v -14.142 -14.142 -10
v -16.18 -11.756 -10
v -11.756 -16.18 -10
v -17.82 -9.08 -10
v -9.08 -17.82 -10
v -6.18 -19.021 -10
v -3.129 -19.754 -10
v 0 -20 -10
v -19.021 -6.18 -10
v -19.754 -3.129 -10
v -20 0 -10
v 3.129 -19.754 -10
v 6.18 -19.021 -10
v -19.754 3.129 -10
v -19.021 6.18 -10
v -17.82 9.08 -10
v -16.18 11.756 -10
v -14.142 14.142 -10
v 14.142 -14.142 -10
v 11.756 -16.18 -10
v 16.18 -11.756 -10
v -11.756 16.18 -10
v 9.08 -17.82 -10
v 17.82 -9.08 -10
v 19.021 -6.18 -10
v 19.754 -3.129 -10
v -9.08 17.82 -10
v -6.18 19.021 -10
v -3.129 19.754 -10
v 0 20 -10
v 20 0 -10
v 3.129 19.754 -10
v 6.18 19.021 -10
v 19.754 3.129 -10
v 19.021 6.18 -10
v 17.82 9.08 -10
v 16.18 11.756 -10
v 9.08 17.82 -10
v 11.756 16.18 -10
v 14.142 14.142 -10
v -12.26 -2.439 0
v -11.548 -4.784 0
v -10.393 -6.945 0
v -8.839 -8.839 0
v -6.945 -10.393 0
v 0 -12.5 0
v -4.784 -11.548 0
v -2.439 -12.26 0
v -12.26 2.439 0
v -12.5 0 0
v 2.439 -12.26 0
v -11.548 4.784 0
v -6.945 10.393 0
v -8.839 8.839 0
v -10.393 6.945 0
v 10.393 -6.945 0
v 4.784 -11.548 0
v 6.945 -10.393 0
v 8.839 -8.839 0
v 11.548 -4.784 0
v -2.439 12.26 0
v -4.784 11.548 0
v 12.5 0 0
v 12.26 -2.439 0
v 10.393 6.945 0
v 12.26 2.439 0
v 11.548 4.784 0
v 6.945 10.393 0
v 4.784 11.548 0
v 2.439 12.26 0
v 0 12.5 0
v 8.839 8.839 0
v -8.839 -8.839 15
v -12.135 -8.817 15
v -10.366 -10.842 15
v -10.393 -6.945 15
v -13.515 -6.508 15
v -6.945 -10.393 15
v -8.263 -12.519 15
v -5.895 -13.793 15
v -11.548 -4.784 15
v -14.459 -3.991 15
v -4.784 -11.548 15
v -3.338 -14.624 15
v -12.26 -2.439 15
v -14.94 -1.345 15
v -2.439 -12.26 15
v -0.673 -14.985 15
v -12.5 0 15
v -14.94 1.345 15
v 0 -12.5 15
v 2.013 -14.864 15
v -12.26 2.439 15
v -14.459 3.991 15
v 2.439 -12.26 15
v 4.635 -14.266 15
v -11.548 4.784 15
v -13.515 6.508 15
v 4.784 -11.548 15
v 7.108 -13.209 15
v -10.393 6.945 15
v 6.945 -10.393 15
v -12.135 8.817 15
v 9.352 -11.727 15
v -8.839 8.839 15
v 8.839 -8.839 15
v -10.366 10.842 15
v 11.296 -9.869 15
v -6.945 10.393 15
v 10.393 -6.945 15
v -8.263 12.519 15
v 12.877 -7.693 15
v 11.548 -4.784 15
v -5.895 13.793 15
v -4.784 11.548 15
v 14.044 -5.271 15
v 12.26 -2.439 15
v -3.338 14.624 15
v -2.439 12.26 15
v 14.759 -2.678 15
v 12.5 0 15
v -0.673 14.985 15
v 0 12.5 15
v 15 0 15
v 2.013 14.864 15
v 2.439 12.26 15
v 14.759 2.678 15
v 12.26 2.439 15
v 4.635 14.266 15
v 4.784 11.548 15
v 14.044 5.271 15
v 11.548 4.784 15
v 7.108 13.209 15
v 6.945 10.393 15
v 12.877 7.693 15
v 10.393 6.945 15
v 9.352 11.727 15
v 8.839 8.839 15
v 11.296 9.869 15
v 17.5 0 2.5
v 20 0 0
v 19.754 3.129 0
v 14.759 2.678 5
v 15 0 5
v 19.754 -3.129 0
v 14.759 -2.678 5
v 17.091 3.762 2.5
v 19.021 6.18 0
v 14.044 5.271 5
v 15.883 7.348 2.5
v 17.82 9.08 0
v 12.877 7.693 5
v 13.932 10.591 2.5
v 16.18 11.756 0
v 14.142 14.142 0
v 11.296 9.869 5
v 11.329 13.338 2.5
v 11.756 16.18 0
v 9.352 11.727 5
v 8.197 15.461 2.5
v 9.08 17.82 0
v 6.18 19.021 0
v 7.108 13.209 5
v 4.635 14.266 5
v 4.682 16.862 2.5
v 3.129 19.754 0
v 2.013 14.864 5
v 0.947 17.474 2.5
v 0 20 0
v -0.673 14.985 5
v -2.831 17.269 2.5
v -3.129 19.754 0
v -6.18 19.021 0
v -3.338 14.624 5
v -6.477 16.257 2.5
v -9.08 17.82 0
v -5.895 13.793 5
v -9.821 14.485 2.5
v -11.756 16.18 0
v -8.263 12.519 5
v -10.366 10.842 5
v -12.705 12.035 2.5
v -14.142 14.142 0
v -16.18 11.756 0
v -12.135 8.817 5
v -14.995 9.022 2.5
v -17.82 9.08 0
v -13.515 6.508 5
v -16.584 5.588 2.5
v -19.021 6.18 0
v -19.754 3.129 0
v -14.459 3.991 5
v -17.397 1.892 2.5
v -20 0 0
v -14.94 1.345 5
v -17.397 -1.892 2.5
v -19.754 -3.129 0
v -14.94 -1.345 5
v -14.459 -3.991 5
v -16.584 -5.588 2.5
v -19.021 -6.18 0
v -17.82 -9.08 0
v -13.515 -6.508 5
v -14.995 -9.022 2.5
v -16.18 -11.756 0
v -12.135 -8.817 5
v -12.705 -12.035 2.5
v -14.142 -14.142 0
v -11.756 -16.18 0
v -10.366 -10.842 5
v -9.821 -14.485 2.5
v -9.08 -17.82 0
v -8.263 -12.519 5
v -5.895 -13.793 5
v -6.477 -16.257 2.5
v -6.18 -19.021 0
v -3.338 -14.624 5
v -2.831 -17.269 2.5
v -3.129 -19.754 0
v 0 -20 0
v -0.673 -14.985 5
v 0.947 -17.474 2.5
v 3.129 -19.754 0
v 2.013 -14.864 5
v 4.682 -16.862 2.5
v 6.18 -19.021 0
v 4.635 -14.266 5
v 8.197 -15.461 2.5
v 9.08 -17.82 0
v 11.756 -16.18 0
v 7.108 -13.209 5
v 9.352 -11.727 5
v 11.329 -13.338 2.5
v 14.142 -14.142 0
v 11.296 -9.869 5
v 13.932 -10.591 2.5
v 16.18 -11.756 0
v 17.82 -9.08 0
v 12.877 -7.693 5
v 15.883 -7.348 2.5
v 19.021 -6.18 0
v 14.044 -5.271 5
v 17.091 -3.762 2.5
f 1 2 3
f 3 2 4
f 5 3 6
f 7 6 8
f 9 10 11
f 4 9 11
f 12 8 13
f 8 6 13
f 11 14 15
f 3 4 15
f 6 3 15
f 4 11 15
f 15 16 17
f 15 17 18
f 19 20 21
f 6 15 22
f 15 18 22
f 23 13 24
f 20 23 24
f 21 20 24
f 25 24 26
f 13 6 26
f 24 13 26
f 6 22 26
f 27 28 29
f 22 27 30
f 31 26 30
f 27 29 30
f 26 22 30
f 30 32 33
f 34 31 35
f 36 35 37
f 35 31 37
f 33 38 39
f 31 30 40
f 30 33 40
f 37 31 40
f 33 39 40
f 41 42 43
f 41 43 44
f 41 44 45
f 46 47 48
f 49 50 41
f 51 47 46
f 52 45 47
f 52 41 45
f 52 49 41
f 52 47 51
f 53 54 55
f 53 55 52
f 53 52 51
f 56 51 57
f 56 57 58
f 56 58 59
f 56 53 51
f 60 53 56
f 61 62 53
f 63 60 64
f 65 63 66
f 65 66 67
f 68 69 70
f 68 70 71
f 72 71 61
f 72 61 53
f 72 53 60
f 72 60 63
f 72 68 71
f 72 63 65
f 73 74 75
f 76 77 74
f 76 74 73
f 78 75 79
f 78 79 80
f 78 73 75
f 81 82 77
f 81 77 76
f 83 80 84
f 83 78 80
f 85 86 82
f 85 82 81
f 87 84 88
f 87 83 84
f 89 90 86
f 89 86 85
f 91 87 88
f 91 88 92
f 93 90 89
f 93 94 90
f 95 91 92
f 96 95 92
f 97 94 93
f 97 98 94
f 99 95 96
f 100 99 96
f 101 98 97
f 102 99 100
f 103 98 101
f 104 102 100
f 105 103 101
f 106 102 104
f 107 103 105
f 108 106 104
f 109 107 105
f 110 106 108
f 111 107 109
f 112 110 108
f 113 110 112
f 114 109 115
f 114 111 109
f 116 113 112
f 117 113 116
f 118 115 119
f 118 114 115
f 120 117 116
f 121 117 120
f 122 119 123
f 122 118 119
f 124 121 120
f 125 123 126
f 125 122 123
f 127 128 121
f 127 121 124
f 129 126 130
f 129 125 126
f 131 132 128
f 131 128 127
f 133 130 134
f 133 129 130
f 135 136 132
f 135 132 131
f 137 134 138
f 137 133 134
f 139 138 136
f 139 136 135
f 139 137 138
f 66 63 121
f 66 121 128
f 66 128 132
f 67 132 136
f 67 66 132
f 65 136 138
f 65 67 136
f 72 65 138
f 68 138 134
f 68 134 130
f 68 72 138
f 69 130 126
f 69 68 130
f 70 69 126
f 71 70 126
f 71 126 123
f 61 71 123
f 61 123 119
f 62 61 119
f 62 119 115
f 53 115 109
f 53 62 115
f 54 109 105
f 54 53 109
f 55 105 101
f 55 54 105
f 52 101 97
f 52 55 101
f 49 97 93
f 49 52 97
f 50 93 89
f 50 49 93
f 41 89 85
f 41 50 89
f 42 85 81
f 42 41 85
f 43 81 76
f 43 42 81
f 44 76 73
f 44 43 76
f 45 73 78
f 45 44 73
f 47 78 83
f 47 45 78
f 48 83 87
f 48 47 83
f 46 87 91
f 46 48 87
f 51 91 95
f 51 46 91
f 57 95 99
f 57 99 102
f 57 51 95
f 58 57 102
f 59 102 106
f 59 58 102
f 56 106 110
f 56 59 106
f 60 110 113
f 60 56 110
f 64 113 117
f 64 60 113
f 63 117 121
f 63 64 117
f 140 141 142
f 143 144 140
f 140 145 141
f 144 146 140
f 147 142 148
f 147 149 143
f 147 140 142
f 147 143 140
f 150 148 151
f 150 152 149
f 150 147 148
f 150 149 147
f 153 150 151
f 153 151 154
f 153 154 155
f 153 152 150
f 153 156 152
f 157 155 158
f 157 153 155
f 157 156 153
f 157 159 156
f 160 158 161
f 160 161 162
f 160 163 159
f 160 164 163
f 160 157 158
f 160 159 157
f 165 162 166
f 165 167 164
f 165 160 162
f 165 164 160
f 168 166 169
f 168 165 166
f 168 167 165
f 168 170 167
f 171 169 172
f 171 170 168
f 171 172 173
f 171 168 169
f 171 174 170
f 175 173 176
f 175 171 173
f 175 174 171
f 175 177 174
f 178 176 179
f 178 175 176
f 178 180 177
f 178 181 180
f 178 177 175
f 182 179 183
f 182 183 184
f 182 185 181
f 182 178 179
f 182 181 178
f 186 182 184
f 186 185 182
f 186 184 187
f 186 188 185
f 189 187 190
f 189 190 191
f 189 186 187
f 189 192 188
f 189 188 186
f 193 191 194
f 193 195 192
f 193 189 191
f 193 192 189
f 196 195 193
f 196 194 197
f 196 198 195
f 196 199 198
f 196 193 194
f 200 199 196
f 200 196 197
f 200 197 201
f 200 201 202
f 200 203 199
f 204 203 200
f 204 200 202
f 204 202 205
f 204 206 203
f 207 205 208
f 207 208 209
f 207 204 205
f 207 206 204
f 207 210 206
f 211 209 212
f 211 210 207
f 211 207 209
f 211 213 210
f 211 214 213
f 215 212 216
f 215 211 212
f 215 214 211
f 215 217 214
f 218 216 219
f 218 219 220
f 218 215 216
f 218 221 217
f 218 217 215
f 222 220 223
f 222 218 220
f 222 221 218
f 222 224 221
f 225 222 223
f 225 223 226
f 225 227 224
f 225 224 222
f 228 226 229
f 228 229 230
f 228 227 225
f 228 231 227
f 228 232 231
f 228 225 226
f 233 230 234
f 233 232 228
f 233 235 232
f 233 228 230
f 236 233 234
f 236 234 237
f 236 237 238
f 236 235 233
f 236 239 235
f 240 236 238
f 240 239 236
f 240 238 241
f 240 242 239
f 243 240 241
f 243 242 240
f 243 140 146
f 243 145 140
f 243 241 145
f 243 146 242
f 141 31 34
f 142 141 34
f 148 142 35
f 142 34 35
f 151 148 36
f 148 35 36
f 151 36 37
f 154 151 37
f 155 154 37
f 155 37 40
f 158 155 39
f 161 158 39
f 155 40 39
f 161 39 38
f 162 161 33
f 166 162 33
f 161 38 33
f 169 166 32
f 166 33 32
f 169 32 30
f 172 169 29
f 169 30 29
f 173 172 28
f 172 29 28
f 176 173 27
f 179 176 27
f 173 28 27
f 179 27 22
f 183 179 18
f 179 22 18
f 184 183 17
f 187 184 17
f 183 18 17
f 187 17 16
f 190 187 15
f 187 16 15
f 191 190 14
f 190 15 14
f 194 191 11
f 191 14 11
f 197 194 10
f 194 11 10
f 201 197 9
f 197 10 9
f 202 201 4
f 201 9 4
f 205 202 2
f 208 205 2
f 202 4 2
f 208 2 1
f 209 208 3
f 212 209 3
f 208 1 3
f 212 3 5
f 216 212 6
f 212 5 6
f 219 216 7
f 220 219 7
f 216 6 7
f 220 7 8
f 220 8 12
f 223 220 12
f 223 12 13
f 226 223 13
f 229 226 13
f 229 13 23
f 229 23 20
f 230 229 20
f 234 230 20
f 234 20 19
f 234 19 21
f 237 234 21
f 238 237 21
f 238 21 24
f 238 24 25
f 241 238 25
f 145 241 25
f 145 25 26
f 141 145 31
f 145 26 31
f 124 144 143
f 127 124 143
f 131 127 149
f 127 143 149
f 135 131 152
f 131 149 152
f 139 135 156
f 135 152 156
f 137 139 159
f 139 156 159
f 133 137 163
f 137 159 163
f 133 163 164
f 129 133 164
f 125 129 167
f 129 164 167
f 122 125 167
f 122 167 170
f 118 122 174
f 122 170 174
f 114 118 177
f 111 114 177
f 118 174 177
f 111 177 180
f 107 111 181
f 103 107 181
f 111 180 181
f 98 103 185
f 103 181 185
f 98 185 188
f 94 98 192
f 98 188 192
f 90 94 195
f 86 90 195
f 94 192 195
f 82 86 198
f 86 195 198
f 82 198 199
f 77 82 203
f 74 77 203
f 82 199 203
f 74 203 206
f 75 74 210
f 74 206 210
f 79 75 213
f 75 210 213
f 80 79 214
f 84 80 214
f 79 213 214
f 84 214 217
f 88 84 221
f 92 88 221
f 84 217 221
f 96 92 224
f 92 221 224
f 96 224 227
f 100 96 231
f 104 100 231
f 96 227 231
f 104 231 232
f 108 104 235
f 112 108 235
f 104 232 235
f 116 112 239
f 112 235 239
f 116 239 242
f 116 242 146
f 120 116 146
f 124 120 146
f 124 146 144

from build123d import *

# Parameters (mm, degrees)
SKETCH1_R           = 15
SKETCH1_R_2         = 12.5
BOSS_EXTRUDE1_DEPTH = 15
BOSS_EXTRUDE2_START = -10
SKETCH1_3_R         = 20
SKETCH1_3_R_2       = 15
SKETCH1_3_R_3       = 12.5
BOSS_EXTRUDE2_DEPTH = 10
CHAMFER1_SIZE       = 5


with BuildPart() as part:
    # Sketch1 → Boss-Extrude1 (new body)
    with BuildSketch(Plane.XY):
        Circle(SKETCH1_R)
        Circle(SKETCH1_R_2, mode=Mode.SUBTRACT)
    extrude(amount=BOSS_EXTRUDE1_DEPTH)

    # Sketch1<3> → Boss-Extrude2 (add)
    # profile 1 of 3: a face of its own
    with BuildSketch(Plane.XY.offset(BOSS_EXTRUDE2_START)):
        Circle(SKETCH1_3_R)
        Circle(SKETCH1_3_R_2, mode=Mode.SUBTRACT)
    # profile 2 of 3: a face of its own
    with BuildSketch(Plane.XY.offset(BOSS_EXTRUDE2_START)):
        Circle(SKETCH1_3_R_2)
        Circle(SKETCH1_3_R_3, mode=Mode.SUBTRACT)
    # profile 3 of 3: a face of its own
    with BuildSketch(Plane.XY.offset(BOSS_EXTRUDE2_START)):
        Circle(SKETCH1_3_R_3)
    extrude(amount=BOSS_EXTRUDE2_DEPTH)

    # Chamfer1
    chamfer1_edges = [part.edges().sort_by_distance(p)[0] for p in [
        (-15, 0, 0),
    ]]
    chamfer(chamfer1_edges, length=CHAMFER1_SIZE - 0.0001)  # a hair under: the kernel refuses the full size


solid = part.part
